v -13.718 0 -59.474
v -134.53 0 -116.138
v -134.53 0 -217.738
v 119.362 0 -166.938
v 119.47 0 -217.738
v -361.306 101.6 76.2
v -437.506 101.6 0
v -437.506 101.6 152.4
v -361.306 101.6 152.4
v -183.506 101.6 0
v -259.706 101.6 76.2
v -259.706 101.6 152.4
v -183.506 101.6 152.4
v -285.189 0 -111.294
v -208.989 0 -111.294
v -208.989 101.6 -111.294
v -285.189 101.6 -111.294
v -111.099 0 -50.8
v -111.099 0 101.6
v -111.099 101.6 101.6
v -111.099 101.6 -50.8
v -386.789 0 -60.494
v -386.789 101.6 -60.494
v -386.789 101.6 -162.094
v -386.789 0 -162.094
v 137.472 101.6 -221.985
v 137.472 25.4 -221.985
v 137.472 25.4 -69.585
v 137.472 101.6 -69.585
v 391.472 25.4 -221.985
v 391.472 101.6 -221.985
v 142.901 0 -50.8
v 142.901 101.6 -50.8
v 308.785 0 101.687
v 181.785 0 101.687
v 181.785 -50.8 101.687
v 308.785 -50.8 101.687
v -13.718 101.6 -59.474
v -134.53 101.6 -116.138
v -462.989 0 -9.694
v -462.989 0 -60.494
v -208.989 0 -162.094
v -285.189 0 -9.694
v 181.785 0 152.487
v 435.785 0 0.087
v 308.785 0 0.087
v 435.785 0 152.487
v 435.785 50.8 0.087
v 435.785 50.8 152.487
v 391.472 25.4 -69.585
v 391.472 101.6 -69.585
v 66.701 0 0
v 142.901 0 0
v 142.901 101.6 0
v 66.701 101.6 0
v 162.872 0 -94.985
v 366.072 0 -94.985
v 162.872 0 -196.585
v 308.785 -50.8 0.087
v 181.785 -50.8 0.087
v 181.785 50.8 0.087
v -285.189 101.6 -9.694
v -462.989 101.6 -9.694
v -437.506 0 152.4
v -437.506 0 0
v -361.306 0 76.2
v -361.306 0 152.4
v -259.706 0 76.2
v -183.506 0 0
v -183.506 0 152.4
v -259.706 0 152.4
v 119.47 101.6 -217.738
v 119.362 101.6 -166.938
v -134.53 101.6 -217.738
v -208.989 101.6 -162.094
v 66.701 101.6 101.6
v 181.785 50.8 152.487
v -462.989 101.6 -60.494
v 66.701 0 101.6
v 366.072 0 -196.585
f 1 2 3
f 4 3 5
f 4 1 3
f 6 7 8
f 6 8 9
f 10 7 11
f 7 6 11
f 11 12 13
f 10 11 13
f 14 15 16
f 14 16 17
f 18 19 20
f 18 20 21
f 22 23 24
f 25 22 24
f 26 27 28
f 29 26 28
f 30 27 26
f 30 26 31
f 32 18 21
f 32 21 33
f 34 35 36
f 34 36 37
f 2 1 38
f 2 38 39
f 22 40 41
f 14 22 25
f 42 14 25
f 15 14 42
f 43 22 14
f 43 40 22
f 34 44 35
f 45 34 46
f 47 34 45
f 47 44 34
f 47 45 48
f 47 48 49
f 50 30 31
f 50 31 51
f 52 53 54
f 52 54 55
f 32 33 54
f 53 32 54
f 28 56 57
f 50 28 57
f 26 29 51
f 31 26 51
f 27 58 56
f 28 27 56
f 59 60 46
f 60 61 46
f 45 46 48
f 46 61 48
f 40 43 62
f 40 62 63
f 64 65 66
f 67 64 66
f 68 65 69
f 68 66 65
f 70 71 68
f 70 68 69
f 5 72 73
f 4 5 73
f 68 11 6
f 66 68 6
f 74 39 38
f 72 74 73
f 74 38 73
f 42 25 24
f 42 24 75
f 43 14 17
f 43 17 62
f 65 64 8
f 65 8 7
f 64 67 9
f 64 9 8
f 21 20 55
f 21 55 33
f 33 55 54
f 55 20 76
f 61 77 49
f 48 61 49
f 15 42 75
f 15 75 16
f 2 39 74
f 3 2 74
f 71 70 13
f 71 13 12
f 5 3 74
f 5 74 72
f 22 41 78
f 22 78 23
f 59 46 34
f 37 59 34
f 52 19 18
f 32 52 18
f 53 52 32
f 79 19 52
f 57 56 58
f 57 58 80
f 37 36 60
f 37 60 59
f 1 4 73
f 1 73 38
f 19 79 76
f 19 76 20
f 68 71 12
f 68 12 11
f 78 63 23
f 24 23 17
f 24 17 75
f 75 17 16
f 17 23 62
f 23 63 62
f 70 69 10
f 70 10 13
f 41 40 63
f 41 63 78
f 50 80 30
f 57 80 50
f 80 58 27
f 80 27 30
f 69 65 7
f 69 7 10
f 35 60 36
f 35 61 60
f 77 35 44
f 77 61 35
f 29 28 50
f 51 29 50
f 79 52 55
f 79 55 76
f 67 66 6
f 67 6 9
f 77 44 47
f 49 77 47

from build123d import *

# Parameters (mm, degrees)
F2_DEPTH  = 101.6
F1_W      = 254
F1_H      = 152.4
F3_DEPTH  = 50.8
F4_W      = 127
F4_H      = 101.6
F5_DEPTH  = 50.8
F7_DEPTH  = 101.6
F9_DEPTH  = 101.6
F11_DEPTH = 101.6
F12_W     = 254
F12_H     = 152.4
F13_DEPTH = 101.6
F14_SIZE  = 25.4


with BuildPart() as f2:
    # F0 (on Front) → F2 (new body)
    with BuildSketch(Plane.XZ):
        Polygon((-437.505946, 0), (-183.505946, 0), (-183.505946, 152.4), (-259.705946, 152.4), (-259.705946, 76.2), (-361.305946, 76.2), (-361.305946, 152.4), (-437.505946, 152.4), align=None)
    extrude(amount=-F2_DEPTH)


with BuildPart() as f3:
    # F1 (on Front) → F3 (new body)
    with BuildSketch(Plane.XZ):
        with Locations((308.784947, 76.286642)):
            Rectangle(F1_W, F1_H)
    extrude(amount=-F3_DEPTH)

    # F4 (on face) → F5 (join)
    with BuildSketch(Plane.XZ):
        with Locations((245.284947, 50.886642)):
            Rectangle(F4_W, F4_H)
    extrude(amount=F5_DEPTH)


with BuildPart() as f7:
    # F6 (on Front) → F7 (new body)
    with BuildSketch(Plane.XZ):
        Polygon((66.700504, 101.6), (-111.099496, 101.6), (-111.099496, -50.8), (142.900504, -50.8), (142.900504, 0), (66.700504, 0), align=None)
    extrude(amount=-F7_DEPTH)


with BuildPart() as f9:
    # F8 (on face) → F9 (new body)
    with BuildSketch(Plane.XZ):
        Polygon((-462.98905, -9.693869), (-462.98905, -60.493869), (-386.78905, -60.493869), (-386.78905, -162.093869), (-208.98905, -162.093869), (-208.98905, -111.293869), (-285.18905, -111.293869), (-285.18905, -9.693869), align=None)
    extrude(amount=-F9_DEPTH)


with BuildPart() as f11:
    # F10 (on Front) → F11 (new body)
    with BuildSketch(Plane.XZ):
        Polygon((-134.530437, -116.137765), (-134.530437, -217.737765), (119.469563, -217.737765), (119.361652, -166.937879), (-13.717981, -59.473646), align=None)
    extrude(amount=-F11_DEPTH)


with BuildPart() as f13:
    # F12 (on Front) → F13 (new body)
    with BuildSketch(Plane.XZ):
        with Locations((264.472376, -145.784959)):
            Rectangle(F12_W, F12_H)
    extrude(amount=-F13_DEPTH)

    # F14
    f14_edges = [f13.edges().sort_by_distance(p)[0] for p in [
        (264.472376, 0, -69.584959),
        (137.472376, 0, -145.784959),
        (264.472376, 0, -221.984959),
        (391.472376, 0, -145.784959),
    ]]
    chamfer(f14_edges, length=F14_SIZE)


solid = Compound([f2.part, f3.part, f7.part, f9.part, f11.part, f13.part])
